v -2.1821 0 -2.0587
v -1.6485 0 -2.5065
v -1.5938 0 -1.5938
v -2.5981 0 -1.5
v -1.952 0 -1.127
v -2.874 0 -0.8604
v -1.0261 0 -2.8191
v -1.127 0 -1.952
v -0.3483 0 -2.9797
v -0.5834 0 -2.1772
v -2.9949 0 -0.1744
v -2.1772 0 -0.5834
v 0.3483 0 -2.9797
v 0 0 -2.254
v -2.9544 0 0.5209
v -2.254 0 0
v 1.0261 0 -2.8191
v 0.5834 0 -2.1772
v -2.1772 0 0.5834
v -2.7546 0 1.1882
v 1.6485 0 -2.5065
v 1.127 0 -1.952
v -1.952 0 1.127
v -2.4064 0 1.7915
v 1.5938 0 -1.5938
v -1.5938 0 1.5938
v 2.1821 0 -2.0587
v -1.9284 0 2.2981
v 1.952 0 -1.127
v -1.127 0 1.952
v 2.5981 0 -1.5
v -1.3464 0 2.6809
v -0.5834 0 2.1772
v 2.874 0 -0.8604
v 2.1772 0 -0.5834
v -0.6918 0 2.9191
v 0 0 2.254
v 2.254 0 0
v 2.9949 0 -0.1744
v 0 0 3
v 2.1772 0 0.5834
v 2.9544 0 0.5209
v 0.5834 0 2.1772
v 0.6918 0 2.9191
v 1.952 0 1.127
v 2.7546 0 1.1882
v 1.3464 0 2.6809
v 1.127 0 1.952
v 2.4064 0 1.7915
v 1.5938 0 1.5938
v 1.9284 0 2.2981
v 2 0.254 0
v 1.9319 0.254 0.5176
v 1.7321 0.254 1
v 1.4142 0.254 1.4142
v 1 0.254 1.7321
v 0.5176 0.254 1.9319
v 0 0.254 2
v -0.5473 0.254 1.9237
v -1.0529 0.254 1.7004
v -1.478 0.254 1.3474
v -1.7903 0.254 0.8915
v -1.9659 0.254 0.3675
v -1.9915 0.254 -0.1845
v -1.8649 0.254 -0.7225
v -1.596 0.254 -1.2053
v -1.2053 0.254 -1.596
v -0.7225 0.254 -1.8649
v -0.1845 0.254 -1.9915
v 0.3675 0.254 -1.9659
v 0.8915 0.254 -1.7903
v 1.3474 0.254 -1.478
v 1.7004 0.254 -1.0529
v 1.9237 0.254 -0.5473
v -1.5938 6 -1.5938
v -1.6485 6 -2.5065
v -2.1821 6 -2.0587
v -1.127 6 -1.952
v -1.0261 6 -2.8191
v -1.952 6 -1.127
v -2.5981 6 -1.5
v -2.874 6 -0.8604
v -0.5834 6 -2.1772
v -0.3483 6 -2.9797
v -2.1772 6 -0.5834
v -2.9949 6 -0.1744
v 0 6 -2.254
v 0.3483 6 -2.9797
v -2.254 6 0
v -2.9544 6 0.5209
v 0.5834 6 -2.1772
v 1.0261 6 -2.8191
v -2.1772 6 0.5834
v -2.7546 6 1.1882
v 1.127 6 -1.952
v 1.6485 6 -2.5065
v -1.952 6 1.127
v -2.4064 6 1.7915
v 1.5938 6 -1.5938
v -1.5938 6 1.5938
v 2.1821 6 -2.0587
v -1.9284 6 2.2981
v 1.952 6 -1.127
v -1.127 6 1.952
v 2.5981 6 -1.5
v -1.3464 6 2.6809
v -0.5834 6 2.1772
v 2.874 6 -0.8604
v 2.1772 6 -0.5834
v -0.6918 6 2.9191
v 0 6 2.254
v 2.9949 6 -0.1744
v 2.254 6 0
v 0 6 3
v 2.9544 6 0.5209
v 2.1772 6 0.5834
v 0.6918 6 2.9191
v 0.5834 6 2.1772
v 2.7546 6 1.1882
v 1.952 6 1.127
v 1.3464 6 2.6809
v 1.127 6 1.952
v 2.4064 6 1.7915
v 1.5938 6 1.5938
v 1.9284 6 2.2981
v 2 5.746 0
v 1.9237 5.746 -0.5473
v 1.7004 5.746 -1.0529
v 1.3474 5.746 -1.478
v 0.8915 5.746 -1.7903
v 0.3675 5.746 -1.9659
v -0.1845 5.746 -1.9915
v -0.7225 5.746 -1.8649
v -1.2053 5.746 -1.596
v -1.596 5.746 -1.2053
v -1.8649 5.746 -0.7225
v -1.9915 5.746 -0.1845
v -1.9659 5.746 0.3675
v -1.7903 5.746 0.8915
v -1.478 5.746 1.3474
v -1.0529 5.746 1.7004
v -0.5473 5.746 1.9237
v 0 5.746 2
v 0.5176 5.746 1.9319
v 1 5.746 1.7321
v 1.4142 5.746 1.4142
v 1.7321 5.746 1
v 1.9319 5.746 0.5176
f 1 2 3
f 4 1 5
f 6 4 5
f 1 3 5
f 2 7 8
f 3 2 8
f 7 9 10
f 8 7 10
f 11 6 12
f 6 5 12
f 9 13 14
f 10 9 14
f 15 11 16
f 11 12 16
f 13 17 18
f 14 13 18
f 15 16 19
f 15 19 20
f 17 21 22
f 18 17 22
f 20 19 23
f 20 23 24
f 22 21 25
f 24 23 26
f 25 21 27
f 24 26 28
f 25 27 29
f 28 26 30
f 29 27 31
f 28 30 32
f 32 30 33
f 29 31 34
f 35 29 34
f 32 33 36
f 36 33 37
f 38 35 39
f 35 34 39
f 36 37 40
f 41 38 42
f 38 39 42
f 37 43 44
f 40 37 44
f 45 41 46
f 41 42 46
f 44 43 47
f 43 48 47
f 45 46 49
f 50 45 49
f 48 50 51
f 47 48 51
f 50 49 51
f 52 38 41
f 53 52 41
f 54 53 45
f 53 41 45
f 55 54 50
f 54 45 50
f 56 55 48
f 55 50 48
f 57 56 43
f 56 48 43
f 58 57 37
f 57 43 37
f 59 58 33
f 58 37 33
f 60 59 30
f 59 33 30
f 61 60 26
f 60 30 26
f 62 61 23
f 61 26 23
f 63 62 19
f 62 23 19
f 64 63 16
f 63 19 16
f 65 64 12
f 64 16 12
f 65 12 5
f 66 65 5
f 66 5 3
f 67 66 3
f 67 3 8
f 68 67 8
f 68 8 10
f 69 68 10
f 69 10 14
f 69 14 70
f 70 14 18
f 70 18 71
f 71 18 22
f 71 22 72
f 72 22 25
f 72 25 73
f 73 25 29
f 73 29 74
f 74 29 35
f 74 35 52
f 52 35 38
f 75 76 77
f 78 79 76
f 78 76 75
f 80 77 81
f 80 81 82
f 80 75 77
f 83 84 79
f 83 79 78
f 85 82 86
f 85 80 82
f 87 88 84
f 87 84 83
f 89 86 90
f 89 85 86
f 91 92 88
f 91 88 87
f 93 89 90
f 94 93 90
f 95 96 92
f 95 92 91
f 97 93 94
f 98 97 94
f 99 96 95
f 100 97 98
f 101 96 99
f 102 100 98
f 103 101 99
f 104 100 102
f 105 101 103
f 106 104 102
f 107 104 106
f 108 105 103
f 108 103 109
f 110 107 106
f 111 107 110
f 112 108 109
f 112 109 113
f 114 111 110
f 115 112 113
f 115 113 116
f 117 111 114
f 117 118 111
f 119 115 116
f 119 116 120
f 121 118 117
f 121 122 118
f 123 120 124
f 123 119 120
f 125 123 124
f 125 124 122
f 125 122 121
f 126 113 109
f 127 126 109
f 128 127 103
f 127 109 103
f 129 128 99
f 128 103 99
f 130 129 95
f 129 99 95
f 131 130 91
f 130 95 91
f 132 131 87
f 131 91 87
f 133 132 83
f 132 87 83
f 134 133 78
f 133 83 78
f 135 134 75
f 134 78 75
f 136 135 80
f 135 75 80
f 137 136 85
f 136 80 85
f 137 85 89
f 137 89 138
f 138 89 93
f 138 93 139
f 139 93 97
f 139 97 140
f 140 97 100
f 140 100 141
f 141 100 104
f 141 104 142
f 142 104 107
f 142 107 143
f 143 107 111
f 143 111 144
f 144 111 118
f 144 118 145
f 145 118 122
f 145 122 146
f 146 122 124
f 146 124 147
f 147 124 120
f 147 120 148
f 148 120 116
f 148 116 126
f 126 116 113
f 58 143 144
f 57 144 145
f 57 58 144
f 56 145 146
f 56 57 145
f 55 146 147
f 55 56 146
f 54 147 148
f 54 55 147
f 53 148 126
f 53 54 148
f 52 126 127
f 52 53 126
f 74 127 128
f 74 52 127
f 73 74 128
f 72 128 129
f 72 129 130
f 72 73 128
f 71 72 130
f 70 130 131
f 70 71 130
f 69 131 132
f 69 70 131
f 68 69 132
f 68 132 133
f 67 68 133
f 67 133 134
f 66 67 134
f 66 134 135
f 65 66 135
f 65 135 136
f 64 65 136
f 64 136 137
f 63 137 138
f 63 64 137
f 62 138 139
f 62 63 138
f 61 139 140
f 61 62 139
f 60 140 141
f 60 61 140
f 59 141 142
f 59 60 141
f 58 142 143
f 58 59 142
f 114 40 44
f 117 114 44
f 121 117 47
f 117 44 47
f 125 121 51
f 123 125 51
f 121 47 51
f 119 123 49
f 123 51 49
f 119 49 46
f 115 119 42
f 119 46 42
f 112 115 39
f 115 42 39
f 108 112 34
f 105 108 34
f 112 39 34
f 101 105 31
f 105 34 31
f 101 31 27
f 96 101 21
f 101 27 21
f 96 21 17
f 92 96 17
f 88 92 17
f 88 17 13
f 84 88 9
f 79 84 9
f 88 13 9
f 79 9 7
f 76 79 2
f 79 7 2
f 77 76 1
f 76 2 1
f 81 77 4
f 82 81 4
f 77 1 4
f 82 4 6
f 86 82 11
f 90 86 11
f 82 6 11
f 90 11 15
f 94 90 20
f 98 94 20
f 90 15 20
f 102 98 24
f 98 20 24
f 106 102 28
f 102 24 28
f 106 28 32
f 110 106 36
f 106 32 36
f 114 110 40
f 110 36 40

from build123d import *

# Parameters (mm, degrees)
SKETCH1_R               = 3
SKETCH1_R_2             = 2
BOSS_EXTRUDE1_DEPTH     = 6
SKETCH3_R               = 2.254
CUT_EXTRUDE1_DEPTH      = 0.254
CUT_EXTRUDE1_DRAFT      = -45
MIRROR1_COPY_1_SKETCH_R = 2.254
MIRROR1_COPY_1_DEPTH    = 0.254
MIRROR1_COPY_1_DRAFT    = -45


with BuildPart() as part:
    # Sketch1 → Boss-Extrude1 (new body)
    with BuildSketch(Plane(origin=(0, 0, 0), x_dir=(1, 0, 0), z_dir=(0, 1, 0))):
        with Locations(Location((0, 0, 0), (0, 0, 270))):
            Circle(SKETCH1_R)
        with Locations(Location((0, 0, 0), (0, 0, 270))):
            Circle(SKETCH1_R_2, mode=Mode.SUBTRACT)
    extrude(amount=BOSS_EXTRUDE1_DEPTH)


with BuildPart() as cut_extrude1_tool:
    # Sketch3 → Cut-Extrude1 (with draft: the straight prism first)
    with BuildSketch(Plane(origin=(0, 6, 0), x_dir=(1, 0, 0), z_dir=(0, 1, 0))):
        Circle(SKETCH3_R)
    extrude(amount=-CUT_EXTRUDE1_DEPTH)
    # Cut-Extrude1: the draft: its side faces are tilted about the plane it starts from
    cut_extrude1_sides = [cut_extrude1_tool.faces().sort_by_distance(p)[0] for p in [
        (-2.254, 5.873, 0),
    ]]
    draft(cut_extrude1_sides, Plane(origin=(0, 6, 0), x_dir=(1, 0, 0), z_dir=(0, 1, 0)), CUT_EXTRUDE1_DRAFT)


with BuildPart() as part_1:
    add(part.part)

    # Cut-Extrude1: cut by cut_extrude1_tool
    add(cut_extrude1_tool.part, mode=Mode.SUBTRACT)


with BuildPart() as mirror1_copy_1_tool:
    # Mirror1 copy 1 sketch → Mirror1 copy 1 (with draft: the straight prism first)
    with BuildSketch(Plane.XZ):
        Circle(MIRROR1_COPY_1_SKETCH_R)
    extrude(amount=-MIRROR1_COPY_1_DEPTH)
    # Mirror1 copy 1: the draft: its side faces are tilted about the plane it starts from
    mirror1_copy_1_sides = [mirror1_copy_1_tool.faces().sort_by_distance(p)[0] for p in [
        (-2.254, 0.127, 0),
    ]]
    draft(mirror1_copy_1_sides, Plane.XZ, MIRROR1_COPY_1_DRAFT)


with BuildPart() as part_2:
    add(part_1.part)

    # Mirror1 copy 1: cut by mirror1_copy_1_tool
    add(mirror1_copy_1_tool.part, mode=Mode.SUBTRACT)


solid = part_2.part
